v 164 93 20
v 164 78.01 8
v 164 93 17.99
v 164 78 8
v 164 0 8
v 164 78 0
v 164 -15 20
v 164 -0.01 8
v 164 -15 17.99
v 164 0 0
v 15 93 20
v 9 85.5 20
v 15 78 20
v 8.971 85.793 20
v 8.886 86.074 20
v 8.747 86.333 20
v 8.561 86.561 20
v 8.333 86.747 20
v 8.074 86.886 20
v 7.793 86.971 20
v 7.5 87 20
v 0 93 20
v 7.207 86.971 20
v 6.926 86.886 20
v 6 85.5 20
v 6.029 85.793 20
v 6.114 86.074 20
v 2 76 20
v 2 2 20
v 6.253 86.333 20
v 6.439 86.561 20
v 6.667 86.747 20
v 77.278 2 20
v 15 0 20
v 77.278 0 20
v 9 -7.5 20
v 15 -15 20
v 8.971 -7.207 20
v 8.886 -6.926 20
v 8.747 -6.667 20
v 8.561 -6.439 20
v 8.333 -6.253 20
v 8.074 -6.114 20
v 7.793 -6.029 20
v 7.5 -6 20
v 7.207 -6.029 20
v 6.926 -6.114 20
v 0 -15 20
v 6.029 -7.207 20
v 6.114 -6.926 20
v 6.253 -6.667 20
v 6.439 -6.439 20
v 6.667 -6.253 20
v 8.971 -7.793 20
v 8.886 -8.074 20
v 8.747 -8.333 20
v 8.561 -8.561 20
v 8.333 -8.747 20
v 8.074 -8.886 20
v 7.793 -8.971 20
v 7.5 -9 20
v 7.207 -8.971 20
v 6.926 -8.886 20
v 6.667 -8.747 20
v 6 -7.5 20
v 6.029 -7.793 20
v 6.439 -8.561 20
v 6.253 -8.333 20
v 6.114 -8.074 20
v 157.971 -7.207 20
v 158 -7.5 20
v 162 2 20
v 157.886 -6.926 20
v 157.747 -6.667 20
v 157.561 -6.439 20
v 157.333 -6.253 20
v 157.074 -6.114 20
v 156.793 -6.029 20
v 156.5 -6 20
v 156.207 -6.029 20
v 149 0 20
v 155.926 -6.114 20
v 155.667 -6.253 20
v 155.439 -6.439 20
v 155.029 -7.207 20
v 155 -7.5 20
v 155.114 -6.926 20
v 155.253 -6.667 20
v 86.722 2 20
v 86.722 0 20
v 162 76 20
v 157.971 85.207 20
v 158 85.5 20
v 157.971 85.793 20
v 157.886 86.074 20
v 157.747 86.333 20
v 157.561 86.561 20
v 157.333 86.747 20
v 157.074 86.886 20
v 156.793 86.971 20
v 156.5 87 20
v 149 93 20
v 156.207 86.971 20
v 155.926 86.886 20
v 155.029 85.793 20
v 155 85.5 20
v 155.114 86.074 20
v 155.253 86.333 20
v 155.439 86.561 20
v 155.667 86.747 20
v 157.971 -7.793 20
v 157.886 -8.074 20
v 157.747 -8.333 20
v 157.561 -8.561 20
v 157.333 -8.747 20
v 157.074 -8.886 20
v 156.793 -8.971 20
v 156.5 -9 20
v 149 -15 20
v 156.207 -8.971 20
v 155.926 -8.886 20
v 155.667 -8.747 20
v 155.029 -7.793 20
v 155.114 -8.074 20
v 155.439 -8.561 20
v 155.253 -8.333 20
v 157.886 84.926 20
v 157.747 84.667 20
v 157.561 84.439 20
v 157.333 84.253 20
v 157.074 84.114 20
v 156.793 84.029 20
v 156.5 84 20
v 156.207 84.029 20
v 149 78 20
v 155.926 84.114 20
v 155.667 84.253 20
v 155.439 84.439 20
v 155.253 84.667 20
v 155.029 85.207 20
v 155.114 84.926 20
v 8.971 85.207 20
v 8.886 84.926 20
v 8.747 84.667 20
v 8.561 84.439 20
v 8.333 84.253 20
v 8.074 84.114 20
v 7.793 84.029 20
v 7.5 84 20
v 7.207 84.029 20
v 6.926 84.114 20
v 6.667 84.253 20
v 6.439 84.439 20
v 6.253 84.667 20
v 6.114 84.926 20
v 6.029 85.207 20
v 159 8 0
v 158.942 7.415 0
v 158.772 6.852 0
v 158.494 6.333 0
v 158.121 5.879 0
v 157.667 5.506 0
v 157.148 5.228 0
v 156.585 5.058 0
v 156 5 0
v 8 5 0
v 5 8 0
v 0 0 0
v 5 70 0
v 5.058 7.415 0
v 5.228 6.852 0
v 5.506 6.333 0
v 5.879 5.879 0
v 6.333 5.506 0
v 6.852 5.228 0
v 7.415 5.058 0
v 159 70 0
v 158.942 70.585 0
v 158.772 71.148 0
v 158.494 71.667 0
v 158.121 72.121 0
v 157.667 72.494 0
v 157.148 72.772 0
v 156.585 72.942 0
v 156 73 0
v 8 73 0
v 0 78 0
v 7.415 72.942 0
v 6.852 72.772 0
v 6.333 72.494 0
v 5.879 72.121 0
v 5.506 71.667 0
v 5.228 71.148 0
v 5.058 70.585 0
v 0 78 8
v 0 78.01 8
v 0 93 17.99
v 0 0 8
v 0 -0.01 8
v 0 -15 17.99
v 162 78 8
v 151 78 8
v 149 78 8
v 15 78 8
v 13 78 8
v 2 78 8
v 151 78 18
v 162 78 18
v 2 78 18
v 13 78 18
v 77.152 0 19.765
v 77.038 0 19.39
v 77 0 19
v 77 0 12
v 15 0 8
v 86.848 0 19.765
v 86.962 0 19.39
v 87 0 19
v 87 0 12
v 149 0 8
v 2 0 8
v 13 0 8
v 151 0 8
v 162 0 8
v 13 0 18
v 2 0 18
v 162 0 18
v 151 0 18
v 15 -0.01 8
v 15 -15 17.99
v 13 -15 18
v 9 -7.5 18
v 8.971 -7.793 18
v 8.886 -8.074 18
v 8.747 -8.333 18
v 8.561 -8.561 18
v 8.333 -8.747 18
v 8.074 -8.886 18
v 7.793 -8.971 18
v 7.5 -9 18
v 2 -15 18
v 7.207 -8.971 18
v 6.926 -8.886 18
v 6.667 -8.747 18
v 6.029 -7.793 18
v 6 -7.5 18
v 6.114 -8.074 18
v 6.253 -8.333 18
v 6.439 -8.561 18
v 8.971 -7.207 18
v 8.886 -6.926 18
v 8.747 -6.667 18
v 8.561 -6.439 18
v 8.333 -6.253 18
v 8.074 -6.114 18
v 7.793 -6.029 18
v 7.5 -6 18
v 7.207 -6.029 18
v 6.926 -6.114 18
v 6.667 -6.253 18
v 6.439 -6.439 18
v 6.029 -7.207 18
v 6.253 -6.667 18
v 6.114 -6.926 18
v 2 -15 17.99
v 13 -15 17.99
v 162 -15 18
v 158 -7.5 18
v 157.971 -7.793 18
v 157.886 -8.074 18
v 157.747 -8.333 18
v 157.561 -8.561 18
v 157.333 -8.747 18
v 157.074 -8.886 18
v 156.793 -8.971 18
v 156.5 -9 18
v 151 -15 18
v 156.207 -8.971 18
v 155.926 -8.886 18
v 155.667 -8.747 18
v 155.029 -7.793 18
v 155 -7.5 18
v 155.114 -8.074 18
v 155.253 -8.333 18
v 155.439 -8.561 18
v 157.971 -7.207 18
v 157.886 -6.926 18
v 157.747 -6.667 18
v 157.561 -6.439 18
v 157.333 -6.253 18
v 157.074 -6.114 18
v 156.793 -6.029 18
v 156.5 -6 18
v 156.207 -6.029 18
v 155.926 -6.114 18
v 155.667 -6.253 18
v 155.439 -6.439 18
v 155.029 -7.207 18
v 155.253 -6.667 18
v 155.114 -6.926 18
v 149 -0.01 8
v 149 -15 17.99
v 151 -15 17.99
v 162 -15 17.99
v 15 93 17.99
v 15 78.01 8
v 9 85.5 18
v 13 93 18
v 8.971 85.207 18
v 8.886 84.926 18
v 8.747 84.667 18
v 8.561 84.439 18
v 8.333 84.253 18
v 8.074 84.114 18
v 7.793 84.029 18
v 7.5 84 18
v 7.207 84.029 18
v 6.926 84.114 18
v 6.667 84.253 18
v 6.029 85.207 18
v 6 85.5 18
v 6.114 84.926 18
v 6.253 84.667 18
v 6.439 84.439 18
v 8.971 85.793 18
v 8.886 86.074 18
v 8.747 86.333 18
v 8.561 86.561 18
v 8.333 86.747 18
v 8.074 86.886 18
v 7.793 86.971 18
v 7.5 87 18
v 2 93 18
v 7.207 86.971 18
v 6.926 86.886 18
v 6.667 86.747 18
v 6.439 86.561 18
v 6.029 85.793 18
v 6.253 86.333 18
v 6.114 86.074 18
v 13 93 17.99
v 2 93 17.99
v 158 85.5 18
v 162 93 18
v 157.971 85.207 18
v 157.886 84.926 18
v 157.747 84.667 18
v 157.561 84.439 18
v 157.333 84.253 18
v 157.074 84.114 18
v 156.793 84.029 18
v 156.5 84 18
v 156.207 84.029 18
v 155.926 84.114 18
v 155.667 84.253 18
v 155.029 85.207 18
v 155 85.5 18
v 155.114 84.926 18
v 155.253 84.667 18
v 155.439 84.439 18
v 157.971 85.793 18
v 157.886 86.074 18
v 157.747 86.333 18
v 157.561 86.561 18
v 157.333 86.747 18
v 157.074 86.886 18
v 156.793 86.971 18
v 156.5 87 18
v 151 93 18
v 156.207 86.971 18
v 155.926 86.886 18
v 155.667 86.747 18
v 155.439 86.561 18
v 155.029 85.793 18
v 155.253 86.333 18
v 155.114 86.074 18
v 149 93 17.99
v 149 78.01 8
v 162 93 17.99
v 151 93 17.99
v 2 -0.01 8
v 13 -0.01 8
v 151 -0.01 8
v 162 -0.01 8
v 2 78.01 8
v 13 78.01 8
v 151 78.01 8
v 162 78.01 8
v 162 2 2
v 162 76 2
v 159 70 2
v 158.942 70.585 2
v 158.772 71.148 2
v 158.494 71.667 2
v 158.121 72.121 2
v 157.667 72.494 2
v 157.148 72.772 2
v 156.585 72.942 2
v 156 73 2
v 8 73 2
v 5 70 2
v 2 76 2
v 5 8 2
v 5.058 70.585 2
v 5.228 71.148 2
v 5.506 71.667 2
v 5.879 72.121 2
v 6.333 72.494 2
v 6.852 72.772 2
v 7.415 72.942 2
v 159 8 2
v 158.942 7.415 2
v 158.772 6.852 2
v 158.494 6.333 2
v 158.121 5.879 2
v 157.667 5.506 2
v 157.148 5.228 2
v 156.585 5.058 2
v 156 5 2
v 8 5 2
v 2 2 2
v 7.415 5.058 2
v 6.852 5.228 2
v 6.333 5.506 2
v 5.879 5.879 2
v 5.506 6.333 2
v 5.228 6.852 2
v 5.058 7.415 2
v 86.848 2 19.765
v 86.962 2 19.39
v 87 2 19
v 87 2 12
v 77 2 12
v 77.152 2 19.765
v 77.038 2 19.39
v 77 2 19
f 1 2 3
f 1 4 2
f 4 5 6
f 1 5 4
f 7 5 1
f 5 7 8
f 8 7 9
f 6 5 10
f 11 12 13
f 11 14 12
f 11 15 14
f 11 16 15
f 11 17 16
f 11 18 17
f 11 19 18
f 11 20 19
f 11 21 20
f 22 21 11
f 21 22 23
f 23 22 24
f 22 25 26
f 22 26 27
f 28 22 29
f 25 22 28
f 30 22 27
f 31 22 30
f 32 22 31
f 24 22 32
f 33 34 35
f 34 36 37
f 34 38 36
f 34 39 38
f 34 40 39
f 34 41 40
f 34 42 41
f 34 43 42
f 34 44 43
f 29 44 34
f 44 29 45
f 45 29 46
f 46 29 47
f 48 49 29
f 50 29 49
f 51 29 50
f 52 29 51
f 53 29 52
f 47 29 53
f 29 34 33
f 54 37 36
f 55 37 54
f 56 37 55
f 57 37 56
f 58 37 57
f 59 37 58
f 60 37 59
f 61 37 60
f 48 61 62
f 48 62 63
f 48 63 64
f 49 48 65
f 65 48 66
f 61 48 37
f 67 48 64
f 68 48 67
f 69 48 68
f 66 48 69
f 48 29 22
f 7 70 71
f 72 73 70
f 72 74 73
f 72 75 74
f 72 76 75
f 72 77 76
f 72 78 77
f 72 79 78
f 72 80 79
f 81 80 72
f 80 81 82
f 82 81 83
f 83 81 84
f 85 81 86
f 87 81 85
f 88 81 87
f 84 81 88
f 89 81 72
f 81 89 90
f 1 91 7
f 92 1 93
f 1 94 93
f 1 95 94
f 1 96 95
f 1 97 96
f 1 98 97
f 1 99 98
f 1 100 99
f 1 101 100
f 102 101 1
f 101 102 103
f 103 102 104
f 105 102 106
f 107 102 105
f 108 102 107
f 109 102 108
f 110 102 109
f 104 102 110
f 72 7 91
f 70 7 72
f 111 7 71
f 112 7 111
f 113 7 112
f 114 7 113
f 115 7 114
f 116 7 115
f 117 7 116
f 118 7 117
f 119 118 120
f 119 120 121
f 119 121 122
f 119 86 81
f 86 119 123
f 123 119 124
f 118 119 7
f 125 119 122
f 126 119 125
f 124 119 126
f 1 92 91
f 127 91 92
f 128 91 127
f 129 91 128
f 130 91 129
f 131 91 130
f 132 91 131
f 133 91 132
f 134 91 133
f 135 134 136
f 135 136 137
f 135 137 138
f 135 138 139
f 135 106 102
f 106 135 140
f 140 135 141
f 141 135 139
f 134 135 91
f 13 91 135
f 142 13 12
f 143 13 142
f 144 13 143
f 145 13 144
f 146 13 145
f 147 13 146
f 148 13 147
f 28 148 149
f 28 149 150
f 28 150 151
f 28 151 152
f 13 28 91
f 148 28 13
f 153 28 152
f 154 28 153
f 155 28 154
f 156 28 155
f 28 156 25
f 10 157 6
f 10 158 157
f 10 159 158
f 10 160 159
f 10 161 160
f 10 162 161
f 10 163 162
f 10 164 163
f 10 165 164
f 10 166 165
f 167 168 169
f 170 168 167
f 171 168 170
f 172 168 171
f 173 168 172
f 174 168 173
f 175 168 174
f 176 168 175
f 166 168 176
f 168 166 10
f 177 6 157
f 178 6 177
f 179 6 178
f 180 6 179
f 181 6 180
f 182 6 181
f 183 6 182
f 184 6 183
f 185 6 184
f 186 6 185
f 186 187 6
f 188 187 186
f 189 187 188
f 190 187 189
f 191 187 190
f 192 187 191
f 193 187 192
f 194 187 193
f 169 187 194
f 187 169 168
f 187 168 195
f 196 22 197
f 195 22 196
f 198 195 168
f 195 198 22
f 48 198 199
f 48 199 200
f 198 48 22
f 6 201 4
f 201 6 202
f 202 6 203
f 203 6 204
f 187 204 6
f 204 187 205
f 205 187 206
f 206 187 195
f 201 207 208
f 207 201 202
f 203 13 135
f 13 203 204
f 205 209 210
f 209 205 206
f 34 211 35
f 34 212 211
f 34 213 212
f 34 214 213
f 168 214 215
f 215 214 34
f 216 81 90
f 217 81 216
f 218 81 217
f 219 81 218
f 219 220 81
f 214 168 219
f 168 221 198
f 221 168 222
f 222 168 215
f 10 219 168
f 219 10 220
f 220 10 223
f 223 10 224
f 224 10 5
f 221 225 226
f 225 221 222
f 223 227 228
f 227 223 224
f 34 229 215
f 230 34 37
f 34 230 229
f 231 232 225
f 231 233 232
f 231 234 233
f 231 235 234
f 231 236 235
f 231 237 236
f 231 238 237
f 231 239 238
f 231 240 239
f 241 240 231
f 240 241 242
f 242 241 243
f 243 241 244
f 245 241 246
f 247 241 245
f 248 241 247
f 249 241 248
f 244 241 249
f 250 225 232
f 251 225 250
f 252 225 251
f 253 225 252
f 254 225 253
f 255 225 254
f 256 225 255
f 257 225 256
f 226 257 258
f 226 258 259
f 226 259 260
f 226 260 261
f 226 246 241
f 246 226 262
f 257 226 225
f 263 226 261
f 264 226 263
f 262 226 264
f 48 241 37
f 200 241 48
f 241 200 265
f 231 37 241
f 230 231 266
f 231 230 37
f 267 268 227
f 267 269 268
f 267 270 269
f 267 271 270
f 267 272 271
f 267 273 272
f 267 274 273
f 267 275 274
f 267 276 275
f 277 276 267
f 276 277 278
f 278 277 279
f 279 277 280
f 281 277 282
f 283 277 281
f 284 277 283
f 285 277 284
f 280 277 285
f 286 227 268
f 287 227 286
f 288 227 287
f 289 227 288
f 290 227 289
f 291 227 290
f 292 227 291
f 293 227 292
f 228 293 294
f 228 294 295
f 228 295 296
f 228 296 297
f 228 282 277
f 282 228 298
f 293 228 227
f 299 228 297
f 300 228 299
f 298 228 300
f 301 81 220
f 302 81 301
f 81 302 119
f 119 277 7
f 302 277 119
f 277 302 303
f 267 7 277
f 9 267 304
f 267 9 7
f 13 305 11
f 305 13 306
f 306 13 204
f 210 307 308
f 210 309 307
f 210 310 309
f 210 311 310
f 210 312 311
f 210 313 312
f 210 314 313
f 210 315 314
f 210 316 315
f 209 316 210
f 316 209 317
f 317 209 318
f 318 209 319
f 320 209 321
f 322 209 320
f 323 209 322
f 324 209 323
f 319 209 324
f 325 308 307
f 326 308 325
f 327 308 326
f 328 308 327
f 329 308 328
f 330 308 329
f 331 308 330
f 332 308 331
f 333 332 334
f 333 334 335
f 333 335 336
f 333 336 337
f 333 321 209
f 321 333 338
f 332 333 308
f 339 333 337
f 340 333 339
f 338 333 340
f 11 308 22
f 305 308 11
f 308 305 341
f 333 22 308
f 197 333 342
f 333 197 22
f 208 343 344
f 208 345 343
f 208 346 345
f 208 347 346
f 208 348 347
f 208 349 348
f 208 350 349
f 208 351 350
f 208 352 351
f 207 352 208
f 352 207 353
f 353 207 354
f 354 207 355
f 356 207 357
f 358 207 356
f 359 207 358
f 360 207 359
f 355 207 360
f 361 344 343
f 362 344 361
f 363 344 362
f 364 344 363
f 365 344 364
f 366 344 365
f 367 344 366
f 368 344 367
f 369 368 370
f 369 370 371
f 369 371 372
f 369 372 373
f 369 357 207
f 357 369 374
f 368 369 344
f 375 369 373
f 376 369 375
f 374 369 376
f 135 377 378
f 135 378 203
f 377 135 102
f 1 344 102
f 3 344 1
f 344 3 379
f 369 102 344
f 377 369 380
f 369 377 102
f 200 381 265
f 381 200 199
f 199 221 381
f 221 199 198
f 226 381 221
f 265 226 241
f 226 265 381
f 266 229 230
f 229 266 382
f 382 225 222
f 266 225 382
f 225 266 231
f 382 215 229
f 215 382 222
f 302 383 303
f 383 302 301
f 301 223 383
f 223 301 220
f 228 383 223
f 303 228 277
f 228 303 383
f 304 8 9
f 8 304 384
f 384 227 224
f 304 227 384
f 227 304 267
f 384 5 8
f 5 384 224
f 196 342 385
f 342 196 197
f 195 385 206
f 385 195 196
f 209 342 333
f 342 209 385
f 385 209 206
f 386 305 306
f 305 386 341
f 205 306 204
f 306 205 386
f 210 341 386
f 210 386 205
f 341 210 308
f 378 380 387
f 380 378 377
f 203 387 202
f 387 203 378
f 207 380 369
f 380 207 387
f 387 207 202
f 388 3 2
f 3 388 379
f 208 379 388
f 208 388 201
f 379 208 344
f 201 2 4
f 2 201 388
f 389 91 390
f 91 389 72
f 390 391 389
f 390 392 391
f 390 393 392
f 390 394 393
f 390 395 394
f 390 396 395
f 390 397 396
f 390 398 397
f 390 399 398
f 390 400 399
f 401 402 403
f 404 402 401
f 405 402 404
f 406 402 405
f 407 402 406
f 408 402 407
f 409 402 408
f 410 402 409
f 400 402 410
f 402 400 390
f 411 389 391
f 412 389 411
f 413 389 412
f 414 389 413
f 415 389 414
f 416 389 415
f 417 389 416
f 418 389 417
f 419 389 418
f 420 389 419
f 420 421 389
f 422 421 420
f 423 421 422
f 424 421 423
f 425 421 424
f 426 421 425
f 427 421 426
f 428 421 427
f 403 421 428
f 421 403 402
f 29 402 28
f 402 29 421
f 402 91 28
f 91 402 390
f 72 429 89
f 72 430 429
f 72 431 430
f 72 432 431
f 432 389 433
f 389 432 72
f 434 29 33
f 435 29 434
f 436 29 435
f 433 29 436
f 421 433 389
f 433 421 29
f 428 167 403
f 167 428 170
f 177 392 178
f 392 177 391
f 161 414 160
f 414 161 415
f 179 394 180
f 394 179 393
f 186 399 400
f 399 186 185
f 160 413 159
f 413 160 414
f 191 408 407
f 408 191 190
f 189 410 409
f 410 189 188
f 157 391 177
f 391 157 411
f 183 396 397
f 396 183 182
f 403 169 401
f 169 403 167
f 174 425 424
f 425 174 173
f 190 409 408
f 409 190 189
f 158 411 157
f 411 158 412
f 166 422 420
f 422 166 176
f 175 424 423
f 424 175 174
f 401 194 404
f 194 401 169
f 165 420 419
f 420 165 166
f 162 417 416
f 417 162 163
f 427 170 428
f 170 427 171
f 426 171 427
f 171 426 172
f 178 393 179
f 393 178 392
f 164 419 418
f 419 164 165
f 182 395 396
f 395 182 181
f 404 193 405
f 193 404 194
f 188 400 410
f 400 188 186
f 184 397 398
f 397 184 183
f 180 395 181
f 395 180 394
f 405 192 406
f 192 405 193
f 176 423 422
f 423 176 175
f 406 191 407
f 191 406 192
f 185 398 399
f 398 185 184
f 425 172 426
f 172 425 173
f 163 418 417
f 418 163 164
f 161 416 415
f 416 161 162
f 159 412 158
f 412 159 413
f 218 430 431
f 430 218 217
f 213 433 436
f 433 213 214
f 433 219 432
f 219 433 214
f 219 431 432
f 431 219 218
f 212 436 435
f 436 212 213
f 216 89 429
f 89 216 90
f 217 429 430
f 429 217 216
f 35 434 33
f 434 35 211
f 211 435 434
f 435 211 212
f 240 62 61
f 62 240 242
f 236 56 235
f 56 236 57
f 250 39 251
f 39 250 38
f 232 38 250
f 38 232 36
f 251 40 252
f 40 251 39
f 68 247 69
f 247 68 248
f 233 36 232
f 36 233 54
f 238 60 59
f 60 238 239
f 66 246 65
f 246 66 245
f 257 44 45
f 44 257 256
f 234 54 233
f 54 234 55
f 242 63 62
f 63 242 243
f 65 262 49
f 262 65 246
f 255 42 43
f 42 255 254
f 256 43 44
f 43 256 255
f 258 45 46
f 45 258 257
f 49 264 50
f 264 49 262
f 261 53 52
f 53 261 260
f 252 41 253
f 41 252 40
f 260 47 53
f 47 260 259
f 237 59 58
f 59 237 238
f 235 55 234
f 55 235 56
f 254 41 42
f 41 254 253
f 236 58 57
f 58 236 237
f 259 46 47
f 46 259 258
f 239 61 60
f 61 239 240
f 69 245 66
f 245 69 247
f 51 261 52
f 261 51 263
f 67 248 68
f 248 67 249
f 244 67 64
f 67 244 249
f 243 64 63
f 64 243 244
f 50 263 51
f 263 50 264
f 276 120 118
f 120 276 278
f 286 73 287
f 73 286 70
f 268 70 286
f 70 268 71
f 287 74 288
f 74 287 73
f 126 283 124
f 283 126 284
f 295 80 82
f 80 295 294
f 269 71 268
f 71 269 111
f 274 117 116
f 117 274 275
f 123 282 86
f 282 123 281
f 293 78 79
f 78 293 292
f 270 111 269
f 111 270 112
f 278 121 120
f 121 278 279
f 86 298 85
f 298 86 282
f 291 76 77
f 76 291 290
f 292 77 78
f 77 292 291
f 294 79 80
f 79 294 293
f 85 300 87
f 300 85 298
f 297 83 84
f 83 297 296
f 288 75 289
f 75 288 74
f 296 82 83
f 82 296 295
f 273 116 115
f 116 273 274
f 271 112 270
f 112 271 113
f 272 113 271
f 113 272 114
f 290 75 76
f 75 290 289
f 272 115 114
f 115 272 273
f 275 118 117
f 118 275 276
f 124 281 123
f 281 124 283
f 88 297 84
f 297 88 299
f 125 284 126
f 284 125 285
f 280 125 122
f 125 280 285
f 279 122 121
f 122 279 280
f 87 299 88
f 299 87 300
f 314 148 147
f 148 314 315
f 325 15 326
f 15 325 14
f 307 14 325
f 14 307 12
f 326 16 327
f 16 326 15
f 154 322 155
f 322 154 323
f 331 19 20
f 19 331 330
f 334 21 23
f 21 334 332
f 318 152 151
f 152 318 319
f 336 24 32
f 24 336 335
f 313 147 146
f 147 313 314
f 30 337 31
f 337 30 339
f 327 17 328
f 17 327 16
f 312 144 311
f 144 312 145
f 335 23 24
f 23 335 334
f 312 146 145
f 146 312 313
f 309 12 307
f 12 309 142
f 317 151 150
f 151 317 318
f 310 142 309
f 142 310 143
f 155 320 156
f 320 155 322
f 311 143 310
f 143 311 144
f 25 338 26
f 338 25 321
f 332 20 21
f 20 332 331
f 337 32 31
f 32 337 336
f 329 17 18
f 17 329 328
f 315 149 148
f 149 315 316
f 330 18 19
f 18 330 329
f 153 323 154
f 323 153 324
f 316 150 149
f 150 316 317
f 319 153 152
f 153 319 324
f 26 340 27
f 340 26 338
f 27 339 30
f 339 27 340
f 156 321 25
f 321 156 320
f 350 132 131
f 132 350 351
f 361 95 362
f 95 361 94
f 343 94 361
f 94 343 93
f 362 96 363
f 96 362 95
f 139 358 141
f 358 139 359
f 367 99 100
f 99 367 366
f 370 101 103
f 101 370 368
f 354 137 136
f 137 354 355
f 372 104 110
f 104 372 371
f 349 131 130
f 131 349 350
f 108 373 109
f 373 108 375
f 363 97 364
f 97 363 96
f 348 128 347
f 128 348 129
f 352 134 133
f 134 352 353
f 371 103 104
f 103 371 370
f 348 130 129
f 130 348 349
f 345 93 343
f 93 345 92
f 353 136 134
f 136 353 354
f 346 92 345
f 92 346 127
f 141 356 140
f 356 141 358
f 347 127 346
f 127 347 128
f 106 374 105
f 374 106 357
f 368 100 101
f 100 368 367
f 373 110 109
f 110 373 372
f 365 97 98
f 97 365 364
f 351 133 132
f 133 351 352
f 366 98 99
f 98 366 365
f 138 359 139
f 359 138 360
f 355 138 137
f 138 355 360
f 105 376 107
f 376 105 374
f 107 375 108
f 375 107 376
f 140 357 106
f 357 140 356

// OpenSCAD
// Box enclosure for 160x74x18mm object

// Inner dimensions (the object to enclose)
inner_length = 160;
inner_width = 74;
inner_height = 18;

// Wall thickness
wall = 2;

// Bottom hole inset from inner walls
hole_inset = 3;

// Bottom hole corner radius
hole_corner_radius = 3;

// Side hole (door) dimensions
side_hole_width = 10;
side_hole_height = 8;
side_hole_corner_radius = 2;

// Overhang dimensions
overhang_width = 15;
overhang_length = 15;

// Screw hole diameter
screw_hole_d = 3;

// Gusset dimensions
gusset_thickness = 2;
gusset_height = 10;

// Outer dimensions
outer_length = inner_length + 2 * wall;
outer_width = inner_width + 2 * wall;
outer_height = inner_height + wall; // wall on bottom only, open top

// Bottom hole dimensions
hole_length = inner_length - 2 * hole_inset;
hole_width = inner_width - 2 * hole_inset;

// Overhang positions along X (flush to edges)
overhang_x1 = 0;
overhang_x2 = outer_length - overhang_width;

// Rounded rectangle module
module rounded_rect(length, width, height, radius) {
    translate([radius, radius, 0])
        hull() {
            cylinder(h = height, r = radius, $fn = 32);
            translate([length - 2 * radius, 0, 0])
                cylinder(h = height, r = radius, $fn = 32);
            translate([0, width - 2 * radius, 0])
                cylinder(h = height, r = radius, $fn = 32);
            translate([length - 2 * radius, width - 2 * radius, 0])
                cylinder(h = height, r = radius, $fn = 32);
        }
}

// Door profile: top corners rounded, bottom corners square
module door_2d(width, height, radius) {
    hull() {
        // Top-left rounded
        translate([radius, height - radius])
            circle(r = radius, $fn = 32);
        // Top-right rounded
        translate([width - radius, height - radius])
            circle(r = radius, $fn = 32);
        // Bottom-left square
        square([0.01, 0.01]);
        // Bottom-right square
        translate([width - 0.01, 0])
            square([0.01, 0.01]);
    }
}

// Gusset module: right-triangle brace
module gusset(length, height, thickness) {
    hull() {
        cube([thickness, 0.01, height]);
        translate([0, length - 0.01, height - 0.01])
            cube([thickness, 0.01, 0.01]);
    }
}

difference() {
    union() {
        // Outer shell
        cube([outer_length, outer_width, outer_height]);

        // Left side overhangs (Y=0, extending in -Y)
        translate([overhang_x1, -overhang_length, outer_height - wall])
            cube([overhang_width, overhang_length, wall]);
        translate([overhang_x2, -overhang_length, outer_height - wall])
            cube([overhang_width, overhang_length, wall]);

        // Right side overhangs (Y=outer_width, extending in +Y)
        translate([overhang_x1, outer_width, outer_height - wall])
            cube([overhang_width, overhang_length, wall]);
        translate([overhang_x2, outer_width, outer_height - wall])
            cube([overhang_width, overhang_length, wall]);

        // Gussets - left side, front overhang
        translate([overhang_x1, 0, outer_height - wall - gusset_height])
            mirror([0, 1, 0])
                gusset(overhang_length, gusset_height, gusset_thickness);
        translate([overhang_x1 + overhang_width - gusset_thickness, 0, outer_height - wall - gusset_height])
            mirror([0, 1, 0])
                gusset(overhang_length, gusset_height, gusset_thickness);

        // Gussets - left side, rear overhang
        translate([overhang_x2, 0, outer_height - wall - gusset_height])
            mirror([0, 1, 0])
                gusset(overhang_length, gusset_height, gusset_thickness);
        translate([overhang_x2 + overhang_width - gusset_thickness, 0, outer_height - wall - gusset_height])
            mirror([0, 1, 0])
                gusset(overhang_length, gusset_height, gusset_thickness);

        // Gussets - right side, front overhang
        translate([overhang_x1, outer_width, outer_height - wall - gusset_height])
            gusset(overhang_length, gusset_height, gusset_thickness);
        translate([overhang_x1 + overhang_width - gusset_thickness, outer_width, outer_height - wall - gusset_height])
            gusset(overhang_length, gusset_height, gusset_thickness);

        // Gussets - right side, rear overhang
        translate([overhang_x2, outer_width, outer_height - wall - gusset_height])
            gusset(overhang_length, gusset_height, gusset_thickness);
        translate([overhang_x2 + overhang_width - gusset_thickness, outer_width, outer_height - wall - gusset_height])
            gusset(overhang_length, gusset_height, gusset_thickness);
    }

    // Inner cavity
    translate([wall, wall, wall])
        cube([inner_length, inner_width, inner_height + 1]);

    // Rounded square hole in the bottom
    translate([wall + hole_inset, wall + hole_inset, -1])
        rounded_rect(hole_length, hole_width, wall + 2, hole_corner_radius);

    // Door on the long side (front), centered horizontally, near top edge
    // Top corners rounded, bottom corners square
    translate([outer_length / 2 - side_hole_width / 2, wall + 1, outer_height - side_hole_height])
        rotate([90, 0, 0])
            linear_extrude(height = wall + 2)
                door_2d(side_hole_width, side_hole_height + 1, side_hole_corner_radius);

    // Screw holes in overhangs - left side
    translate([overhang_x1 + overhang_width / 2, -overhang_length / 2, outer_height - wall - 1])
        cylinder(h = wall + 2, d = screw_hole_d, $fn = 32);
    translate([overhang_x2 + overhang_width / 2, -overhang_length / 2, outer_height - wall - 1])
        cylinder(h = wall + 2, d = screw_hole_d, $fn = 32);

    // Screw holes in overhangs - right side
    translate([overhang_x1 + overhang_width / 2, outer_width + overhang_length / 2, outer_height - wall - 1])
        cylinder(h = wall + 2, d = screw_hole_d, $fn = 32);
    translate([overhang_x2 + overhang_width / 2, outer_width + overhang_length / 2, outer_height - wall - 1])
        cylinder(h = wall + 2, d = screw_hole_d, $fn = 32);
}
